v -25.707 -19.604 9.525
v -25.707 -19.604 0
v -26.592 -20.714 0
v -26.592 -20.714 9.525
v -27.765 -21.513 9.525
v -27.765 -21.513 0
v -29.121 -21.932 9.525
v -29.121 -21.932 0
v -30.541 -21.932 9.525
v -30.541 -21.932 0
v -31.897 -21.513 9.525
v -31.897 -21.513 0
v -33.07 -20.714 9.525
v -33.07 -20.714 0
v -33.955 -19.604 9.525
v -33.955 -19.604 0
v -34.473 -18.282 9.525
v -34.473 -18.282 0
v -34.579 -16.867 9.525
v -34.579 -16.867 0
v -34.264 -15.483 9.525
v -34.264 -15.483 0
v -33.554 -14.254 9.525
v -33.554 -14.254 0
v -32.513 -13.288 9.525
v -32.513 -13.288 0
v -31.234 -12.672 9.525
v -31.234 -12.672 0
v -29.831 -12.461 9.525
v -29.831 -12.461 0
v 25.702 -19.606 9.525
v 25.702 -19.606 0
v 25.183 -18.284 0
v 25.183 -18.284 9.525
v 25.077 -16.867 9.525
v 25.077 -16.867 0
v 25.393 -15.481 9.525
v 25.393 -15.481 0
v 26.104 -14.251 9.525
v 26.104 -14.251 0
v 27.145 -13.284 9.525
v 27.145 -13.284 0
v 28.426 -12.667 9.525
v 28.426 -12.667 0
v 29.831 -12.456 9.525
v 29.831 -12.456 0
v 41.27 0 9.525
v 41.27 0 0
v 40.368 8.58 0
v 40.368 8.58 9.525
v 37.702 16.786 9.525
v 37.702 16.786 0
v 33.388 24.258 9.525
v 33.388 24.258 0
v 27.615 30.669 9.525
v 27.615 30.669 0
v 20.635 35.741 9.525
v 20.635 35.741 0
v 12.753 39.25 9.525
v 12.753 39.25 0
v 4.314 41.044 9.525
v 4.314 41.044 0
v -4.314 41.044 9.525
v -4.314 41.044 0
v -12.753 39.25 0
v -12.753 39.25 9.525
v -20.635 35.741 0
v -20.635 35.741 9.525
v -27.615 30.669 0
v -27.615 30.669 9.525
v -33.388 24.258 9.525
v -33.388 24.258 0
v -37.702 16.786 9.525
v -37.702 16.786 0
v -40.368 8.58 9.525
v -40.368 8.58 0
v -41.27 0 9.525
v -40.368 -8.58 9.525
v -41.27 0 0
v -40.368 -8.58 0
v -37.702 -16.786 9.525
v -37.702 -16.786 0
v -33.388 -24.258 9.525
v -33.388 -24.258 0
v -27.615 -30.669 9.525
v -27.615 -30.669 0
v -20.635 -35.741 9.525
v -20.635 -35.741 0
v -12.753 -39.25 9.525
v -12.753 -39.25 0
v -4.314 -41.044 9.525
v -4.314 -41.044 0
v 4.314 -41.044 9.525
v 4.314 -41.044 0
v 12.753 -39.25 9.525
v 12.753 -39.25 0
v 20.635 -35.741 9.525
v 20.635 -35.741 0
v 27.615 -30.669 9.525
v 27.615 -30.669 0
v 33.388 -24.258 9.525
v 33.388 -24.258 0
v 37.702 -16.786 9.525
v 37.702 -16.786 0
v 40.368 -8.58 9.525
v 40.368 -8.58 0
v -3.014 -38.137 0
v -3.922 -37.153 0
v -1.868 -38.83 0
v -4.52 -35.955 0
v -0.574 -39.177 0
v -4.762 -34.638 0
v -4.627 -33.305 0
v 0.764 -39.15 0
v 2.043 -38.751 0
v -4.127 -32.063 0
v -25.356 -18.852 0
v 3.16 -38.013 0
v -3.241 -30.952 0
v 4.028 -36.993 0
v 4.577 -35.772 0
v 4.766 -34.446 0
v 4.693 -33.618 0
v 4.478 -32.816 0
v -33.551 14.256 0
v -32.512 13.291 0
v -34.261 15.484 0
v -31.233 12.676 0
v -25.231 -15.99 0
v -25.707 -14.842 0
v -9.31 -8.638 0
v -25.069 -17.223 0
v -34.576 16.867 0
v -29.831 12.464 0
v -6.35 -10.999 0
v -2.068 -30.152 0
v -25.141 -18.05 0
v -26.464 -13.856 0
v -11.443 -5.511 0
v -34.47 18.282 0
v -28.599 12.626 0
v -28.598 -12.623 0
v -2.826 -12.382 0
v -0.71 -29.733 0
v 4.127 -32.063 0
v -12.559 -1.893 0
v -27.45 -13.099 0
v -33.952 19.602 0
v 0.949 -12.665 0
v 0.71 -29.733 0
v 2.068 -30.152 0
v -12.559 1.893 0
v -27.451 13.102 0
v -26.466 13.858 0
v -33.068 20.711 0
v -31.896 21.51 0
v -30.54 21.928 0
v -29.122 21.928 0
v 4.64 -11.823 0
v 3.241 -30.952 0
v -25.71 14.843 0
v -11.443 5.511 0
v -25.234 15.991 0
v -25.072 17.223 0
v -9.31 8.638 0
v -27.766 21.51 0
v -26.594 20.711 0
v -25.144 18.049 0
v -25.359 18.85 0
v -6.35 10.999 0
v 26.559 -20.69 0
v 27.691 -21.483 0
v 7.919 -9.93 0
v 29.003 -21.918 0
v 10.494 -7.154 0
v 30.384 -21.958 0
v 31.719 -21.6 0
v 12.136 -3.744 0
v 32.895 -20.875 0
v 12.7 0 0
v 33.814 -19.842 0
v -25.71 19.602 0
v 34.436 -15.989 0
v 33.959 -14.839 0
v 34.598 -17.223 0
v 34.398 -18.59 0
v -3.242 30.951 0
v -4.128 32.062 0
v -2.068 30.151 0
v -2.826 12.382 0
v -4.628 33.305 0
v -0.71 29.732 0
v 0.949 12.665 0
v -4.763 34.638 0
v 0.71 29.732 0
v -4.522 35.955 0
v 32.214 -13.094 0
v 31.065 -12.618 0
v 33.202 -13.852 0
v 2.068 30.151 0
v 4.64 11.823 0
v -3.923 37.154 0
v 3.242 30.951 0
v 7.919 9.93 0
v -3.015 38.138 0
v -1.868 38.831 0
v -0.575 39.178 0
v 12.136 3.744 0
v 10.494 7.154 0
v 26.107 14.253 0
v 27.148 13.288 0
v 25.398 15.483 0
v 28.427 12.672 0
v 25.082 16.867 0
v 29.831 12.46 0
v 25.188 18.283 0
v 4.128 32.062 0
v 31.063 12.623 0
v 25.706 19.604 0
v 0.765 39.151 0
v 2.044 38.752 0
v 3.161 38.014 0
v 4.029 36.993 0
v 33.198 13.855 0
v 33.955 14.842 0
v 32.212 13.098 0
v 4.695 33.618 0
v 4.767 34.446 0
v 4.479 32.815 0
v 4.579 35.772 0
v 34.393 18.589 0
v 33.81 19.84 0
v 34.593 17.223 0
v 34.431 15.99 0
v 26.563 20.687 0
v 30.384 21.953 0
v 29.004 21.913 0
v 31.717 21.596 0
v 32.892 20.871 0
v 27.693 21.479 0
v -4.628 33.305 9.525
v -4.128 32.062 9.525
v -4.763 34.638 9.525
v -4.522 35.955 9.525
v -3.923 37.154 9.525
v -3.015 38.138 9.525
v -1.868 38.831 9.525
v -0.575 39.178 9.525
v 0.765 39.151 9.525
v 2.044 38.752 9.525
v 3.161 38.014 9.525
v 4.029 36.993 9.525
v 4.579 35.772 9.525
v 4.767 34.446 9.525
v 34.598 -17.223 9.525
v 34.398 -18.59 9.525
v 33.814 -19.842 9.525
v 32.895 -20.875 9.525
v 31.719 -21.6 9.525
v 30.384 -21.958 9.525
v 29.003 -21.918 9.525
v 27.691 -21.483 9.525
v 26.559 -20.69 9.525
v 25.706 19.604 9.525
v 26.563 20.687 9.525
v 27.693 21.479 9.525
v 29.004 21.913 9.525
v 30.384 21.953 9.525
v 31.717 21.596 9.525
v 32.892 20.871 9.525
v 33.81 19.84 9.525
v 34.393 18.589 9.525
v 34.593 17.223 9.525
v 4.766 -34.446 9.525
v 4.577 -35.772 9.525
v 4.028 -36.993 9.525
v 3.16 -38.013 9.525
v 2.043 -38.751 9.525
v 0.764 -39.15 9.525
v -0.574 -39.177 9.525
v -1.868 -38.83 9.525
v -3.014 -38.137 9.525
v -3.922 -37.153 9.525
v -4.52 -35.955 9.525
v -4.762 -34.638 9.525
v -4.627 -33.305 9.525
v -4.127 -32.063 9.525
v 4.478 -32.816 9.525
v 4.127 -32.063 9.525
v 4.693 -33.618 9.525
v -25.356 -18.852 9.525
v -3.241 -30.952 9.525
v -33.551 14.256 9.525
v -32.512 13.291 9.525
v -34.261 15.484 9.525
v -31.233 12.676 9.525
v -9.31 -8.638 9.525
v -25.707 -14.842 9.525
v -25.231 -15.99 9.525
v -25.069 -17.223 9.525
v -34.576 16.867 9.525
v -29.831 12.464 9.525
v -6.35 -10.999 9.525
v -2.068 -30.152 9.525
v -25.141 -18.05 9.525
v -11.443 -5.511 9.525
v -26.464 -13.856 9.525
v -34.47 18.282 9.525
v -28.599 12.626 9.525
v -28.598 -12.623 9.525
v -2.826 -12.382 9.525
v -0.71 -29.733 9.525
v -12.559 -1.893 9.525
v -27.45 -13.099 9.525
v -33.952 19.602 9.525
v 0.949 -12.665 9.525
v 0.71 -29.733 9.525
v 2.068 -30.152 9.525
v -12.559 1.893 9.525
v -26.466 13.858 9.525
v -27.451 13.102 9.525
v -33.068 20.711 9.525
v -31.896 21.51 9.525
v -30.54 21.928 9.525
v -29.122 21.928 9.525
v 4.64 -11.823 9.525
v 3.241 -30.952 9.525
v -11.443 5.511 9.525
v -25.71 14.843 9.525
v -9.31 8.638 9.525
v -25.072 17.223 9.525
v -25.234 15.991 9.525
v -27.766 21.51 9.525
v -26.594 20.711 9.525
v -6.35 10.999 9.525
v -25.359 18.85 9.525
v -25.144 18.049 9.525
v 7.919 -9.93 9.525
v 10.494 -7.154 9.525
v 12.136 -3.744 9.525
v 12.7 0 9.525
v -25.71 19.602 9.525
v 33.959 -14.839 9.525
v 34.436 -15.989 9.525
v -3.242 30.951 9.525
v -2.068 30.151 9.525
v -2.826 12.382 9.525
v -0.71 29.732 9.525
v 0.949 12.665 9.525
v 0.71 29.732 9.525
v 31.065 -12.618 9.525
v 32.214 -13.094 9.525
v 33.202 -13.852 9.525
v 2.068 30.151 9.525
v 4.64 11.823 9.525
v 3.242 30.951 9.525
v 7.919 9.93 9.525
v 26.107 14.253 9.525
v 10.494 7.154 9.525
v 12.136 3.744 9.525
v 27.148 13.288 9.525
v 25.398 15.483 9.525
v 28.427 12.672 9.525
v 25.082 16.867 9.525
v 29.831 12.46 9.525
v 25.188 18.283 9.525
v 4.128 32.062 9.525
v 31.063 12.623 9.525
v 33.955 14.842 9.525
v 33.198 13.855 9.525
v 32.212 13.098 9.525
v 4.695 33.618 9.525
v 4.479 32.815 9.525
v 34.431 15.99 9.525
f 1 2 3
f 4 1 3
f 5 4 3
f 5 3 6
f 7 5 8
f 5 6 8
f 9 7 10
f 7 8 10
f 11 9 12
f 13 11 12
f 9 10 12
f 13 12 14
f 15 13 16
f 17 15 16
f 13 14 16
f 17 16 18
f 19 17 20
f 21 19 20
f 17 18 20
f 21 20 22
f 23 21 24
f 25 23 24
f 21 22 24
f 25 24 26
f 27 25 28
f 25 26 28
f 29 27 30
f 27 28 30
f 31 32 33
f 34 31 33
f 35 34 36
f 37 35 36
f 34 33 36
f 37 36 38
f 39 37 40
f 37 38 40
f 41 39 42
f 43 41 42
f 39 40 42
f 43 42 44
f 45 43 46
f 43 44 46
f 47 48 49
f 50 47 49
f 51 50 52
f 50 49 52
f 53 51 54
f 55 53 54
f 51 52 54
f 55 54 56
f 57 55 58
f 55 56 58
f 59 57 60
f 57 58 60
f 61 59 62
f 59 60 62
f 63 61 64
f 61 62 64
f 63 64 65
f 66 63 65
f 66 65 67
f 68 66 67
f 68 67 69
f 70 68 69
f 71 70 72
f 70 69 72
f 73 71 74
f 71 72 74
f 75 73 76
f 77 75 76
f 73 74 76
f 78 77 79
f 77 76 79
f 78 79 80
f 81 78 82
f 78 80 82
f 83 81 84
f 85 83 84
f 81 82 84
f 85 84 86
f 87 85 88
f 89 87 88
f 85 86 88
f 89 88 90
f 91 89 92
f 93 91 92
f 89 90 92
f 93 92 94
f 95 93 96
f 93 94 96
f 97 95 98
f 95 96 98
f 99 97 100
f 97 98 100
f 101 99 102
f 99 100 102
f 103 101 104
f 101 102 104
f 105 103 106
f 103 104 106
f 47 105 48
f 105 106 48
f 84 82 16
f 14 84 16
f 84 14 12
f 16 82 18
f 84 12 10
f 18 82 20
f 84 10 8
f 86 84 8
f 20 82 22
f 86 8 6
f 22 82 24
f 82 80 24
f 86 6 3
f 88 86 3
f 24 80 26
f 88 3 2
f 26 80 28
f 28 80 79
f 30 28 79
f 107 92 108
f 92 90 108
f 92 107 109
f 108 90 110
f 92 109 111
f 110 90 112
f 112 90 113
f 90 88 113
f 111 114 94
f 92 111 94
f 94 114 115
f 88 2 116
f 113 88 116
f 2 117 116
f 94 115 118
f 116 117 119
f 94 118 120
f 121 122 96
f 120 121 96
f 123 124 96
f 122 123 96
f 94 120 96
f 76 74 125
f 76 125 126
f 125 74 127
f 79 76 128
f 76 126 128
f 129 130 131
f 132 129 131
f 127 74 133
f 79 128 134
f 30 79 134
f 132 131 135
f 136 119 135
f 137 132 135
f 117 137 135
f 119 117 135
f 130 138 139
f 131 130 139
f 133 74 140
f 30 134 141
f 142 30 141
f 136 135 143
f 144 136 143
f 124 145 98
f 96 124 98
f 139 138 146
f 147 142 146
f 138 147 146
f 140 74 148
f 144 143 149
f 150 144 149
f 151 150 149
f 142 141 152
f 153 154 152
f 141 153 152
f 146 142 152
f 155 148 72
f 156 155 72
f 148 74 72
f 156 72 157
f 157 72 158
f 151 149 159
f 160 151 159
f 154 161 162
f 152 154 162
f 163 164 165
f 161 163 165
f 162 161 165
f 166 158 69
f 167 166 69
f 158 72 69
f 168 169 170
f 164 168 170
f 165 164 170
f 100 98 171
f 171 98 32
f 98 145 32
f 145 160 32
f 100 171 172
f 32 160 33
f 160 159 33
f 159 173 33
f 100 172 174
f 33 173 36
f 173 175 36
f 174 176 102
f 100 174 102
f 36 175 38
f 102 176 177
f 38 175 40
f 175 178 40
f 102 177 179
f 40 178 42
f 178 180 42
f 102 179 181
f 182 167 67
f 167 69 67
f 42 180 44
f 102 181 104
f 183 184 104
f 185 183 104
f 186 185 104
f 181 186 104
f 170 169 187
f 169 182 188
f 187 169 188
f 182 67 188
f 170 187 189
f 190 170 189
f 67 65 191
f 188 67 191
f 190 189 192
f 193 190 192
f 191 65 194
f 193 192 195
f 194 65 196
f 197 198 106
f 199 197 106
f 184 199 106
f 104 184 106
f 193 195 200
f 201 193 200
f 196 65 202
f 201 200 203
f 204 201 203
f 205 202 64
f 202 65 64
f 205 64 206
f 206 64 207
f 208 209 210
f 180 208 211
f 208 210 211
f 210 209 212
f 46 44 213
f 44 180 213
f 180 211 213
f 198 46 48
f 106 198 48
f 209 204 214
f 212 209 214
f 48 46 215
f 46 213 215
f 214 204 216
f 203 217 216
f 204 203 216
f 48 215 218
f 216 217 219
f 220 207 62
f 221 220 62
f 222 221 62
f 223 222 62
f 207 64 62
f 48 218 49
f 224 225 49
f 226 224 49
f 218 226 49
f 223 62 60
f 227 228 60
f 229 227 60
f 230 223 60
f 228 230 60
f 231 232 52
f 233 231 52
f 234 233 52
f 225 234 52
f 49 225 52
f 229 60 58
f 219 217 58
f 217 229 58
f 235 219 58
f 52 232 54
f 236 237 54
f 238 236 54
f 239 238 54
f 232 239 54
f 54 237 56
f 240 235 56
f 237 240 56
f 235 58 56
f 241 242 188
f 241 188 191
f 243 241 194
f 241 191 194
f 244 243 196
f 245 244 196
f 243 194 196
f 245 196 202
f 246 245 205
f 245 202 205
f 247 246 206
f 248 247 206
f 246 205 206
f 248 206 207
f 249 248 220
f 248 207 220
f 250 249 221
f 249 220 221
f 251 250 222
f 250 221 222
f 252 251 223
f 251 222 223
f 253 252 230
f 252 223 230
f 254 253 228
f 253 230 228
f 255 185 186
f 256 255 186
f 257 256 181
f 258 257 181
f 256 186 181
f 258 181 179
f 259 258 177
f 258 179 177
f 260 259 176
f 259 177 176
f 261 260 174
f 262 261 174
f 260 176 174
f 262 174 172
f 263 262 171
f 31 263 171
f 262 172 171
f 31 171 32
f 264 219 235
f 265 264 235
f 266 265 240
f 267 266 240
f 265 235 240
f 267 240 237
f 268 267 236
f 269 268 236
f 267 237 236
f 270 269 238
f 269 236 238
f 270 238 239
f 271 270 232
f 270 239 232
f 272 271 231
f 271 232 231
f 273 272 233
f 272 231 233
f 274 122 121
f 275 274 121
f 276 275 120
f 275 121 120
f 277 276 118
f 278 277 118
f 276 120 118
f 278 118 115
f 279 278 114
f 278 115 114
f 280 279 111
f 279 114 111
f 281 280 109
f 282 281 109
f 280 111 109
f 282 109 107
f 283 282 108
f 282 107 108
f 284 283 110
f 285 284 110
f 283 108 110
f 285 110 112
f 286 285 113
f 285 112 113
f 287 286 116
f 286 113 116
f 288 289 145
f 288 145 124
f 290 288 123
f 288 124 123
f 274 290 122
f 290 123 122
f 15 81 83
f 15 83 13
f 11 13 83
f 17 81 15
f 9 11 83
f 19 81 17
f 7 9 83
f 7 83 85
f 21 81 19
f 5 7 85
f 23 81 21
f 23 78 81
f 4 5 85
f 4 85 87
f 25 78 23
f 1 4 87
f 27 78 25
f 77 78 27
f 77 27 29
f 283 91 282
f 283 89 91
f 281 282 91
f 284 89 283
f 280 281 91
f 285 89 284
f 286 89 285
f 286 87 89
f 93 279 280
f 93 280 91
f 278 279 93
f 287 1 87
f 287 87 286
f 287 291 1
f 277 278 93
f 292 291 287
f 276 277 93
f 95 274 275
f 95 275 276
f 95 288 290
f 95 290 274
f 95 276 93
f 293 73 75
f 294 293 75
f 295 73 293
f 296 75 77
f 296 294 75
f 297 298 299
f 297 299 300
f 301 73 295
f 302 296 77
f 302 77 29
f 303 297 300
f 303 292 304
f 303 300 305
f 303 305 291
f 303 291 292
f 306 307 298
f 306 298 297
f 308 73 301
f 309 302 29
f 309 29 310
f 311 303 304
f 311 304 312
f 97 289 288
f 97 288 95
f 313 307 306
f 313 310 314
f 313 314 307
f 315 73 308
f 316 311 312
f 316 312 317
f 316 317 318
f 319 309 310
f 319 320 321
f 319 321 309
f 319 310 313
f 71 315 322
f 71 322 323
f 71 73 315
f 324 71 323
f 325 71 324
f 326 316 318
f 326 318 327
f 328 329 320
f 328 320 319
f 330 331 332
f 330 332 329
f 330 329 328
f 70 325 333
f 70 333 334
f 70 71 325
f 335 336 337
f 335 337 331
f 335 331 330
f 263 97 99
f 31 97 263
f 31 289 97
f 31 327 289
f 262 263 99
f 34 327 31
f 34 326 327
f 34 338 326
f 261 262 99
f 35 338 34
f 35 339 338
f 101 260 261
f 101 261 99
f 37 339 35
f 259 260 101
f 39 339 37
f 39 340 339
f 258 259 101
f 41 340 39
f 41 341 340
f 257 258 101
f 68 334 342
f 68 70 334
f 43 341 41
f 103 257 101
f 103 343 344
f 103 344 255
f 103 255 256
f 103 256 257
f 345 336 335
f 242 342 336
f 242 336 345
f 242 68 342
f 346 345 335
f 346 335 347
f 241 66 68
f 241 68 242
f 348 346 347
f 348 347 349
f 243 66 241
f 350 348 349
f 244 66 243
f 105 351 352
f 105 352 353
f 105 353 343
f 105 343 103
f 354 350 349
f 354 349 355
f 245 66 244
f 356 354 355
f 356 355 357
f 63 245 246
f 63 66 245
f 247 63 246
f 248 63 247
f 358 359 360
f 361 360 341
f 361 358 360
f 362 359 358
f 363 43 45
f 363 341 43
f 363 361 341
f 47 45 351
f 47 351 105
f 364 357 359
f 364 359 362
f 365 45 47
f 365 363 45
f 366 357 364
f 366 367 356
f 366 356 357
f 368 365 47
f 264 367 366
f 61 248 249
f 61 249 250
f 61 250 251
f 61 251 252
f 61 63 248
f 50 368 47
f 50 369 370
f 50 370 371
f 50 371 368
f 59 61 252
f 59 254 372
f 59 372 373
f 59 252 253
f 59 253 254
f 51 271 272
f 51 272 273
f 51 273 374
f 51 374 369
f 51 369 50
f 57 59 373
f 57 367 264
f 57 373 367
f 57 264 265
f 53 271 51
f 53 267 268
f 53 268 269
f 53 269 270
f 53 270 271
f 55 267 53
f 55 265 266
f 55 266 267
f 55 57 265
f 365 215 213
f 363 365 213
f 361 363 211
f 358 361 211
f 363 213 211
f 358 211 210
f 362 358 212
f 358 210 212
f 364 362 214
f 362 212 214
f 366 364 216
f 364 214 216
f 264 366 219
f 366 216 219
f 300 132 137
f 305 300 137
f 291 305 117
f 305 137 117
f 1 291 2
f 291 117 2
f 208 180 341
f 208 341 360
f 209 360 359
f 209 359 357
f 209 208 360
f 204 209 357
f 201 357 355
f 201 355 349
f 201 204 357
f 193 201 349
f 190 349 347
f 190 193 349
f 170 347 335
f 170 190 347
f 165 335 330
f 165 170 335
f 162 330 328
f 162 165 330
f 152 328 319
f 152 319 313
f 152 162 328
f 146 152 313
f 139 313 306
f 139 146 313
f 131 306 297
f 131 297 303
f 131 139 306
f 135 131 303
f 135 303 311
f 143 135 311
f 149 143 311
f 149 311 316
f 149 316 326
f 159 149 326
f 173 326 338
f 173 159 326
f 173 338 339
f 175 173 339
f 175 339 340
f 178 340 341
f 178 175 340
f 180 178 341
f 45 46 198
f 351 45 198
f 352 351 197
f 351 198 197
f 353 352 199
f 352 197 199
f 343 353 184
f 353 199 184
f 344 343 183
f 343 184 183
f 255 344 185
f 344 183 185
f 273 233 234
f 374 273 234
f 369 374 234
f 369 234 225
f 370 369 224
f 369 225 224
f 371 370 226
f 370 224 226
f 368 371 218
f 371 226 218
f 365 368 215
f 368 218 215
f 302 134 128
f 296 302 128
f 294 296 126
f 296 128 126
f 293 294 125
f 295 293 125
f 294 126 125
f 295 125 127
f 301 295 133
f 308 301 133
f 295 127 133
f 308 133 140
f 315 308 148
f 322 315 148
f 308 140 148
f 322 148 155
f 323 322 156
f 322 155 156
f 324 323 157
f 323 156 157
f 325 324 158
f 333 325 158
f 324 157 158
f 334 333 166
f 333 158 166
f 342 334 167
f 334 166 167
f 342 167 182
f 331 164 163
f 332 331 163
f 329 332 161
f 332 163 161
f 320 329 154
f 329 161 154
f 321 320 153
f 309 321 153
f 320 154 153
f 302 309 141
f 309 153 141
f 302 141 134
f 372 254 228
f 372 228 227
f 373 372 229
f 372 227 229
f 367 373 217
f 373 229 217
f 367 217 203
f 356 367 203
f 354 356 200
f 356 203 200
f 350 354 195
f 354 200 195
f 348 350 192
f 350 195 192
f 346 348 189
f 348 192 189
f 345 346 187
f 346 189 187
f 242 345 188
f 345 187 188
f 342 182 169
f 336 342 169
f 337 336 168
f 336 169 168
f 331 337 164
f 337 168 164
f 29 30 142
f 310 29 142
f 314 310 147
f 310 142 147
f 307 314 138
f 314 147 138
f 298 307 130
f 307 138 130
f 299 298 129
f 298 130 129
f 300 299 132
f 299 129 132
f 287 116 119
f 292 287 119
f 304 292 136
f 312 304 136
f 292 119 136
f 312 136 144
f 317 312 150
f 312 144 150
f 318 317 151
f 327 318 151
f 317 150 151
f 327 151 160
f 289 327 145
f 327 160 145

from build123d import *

# Parameters (mm, degrees)
F0_R     = 41.2696821878
F0_R_2   = 12.7004431624
F1_DEPTH = 9.525


# Not quite as in the source:
# - a feature names something its author has since deleted; it is built from what else it names


with BuildPart() as f1:
    # F0 (on Top) → F1 (new body)
    with BuildSketch(Plane.XY):
        Circle(F0_R)
        with BuildLine():
            ThreePointArc((34.593341478, 17.2228345975), (33.1984325721, 13.8552265986), (29.8308245732, 12.4603176927))
            Line((29.8308245732, 12.4603176927), (29.8308245732, -12.4556027445))
            ThreePointArc((29.8308245732, -12.4556027445), (33.201766544, -13.8518926268), (34.5980564262, -17.2228345975))
            ThreePointArc((34.5980564262, -17.2228345975), (31.0646749692, -21.8276269642), (25.7022806828, -19.606450524))
            Line((25.7022806828, -19.606450524), (4.1271236512, -32.062873244))
            ThreePointArc((4.1271236512, -32.062873244), (4.6032082956, -33.2122432496), (4.7655919019, -34.445669195))
            ThreePointArc((4.7655919019, -34.445669195), (-1.2334259454, -39.0488774906), (-4.1271236512, -32.062873244))
            Line((-4.1271236512, -32.062873244), (-25.7068508494, -19.6038119371))
            ThreePointArc((-25.7068508494, -19.6038119371), (-33.9547982971, -19.6038119371), (-29.8308245732, -12.4608799183))
            Line((-29.8308245732, -12.4608799183), (-29.8308245732, 12.464098707))
            ThreePointArc((-29.8308245732, 12.464098707), (-33.9520107443, 19.6022025428), (-25.7096384021, 19.6022025428))
            Line((-25.7096384021, 19.6022025428), (-4.1283119696, 32.062187168))
            ThreePointArc((-4.1283119696, 32.062187168), (-1.2337810845, 39.0502028877), (4.766964054, 34.445669195))
            ThreePointArc((4.766964054, 34.445669195), (4.6045336927, 33.2118881105), (4.1283119696, 32.062187168))
            Line((4.1283119696, 32.062187168), (25.7063639477, 19.6040930499))
            ThreePointArc((25.7063639477, 19.6040930499), (31.0634546508, 21.823072674), (34.593341478, 17.2228345975))
        make_face(mode=Mode.SUBTRACT)
        with BuildLine():
            Line((29.8308245732, -12.4556027445), (29.8308245732, 12.4603176927))
            ThreePointArc((29.8308245732, 12.4603176927), (25.7063639477, 14.8415761451), (25.7063639477, 19.6040930499))
            Line((25.7063639477, 19.6040930499), (4.1283119696, 32.062187168))
            ThreePointArc((4.1283119696, 32.062187168), (0, 29.6787051411), (-4.1283119696, 32.062187168))
            Line((-4.1283119696, 32.062187168), (-25.7096384021, 19.6022025428))
            ThreePointArc((-25.7096384021, 19.6022025428), (-25.2342386761, 18.4544860766), (-25.0720886827, 17.2228345975))
            ThreePointArc((-25.0720886827, 17.2228345975), (-26.4658901552, 13.8579001794), (-29.8308245732, 12.464098707))
            Line((-29.8308245732, 12.464098707), (-29.8308245732, -12.4608799183))
            ThreePointArc((-29.8308245732, -12.4608799183), (-26.4636141278, -13.8556241521), (-25.068869894, -17.2228345975))
            ThreePointArc((-25.068869894, -17.2228345975), (-25.231129565, -18.4553191604), (-25.7068508494, -19.6038119371))
            Line((-25.7068508494, -19.6038119371), (-4.1271236512, -32.062873244))
            ThreePointArc((-4.1271236512, -32.062873244), (0, -29.6800772931), (4.1271236512, -32.062873244))
            Line((4.1271236512, -32.062873244), (25.7022806828, -19.606450524))
            ThreePointArc((25.7022806828, -19.606450524), (25.7022806828, -14.839218671), (29.8308245732, -12.4556027445))
        make_face()
        Circle(F0_R_2, mode=Mode.SUBTRACT)
    extrude(amount=F1_DEPTH)


solid = f1.part
